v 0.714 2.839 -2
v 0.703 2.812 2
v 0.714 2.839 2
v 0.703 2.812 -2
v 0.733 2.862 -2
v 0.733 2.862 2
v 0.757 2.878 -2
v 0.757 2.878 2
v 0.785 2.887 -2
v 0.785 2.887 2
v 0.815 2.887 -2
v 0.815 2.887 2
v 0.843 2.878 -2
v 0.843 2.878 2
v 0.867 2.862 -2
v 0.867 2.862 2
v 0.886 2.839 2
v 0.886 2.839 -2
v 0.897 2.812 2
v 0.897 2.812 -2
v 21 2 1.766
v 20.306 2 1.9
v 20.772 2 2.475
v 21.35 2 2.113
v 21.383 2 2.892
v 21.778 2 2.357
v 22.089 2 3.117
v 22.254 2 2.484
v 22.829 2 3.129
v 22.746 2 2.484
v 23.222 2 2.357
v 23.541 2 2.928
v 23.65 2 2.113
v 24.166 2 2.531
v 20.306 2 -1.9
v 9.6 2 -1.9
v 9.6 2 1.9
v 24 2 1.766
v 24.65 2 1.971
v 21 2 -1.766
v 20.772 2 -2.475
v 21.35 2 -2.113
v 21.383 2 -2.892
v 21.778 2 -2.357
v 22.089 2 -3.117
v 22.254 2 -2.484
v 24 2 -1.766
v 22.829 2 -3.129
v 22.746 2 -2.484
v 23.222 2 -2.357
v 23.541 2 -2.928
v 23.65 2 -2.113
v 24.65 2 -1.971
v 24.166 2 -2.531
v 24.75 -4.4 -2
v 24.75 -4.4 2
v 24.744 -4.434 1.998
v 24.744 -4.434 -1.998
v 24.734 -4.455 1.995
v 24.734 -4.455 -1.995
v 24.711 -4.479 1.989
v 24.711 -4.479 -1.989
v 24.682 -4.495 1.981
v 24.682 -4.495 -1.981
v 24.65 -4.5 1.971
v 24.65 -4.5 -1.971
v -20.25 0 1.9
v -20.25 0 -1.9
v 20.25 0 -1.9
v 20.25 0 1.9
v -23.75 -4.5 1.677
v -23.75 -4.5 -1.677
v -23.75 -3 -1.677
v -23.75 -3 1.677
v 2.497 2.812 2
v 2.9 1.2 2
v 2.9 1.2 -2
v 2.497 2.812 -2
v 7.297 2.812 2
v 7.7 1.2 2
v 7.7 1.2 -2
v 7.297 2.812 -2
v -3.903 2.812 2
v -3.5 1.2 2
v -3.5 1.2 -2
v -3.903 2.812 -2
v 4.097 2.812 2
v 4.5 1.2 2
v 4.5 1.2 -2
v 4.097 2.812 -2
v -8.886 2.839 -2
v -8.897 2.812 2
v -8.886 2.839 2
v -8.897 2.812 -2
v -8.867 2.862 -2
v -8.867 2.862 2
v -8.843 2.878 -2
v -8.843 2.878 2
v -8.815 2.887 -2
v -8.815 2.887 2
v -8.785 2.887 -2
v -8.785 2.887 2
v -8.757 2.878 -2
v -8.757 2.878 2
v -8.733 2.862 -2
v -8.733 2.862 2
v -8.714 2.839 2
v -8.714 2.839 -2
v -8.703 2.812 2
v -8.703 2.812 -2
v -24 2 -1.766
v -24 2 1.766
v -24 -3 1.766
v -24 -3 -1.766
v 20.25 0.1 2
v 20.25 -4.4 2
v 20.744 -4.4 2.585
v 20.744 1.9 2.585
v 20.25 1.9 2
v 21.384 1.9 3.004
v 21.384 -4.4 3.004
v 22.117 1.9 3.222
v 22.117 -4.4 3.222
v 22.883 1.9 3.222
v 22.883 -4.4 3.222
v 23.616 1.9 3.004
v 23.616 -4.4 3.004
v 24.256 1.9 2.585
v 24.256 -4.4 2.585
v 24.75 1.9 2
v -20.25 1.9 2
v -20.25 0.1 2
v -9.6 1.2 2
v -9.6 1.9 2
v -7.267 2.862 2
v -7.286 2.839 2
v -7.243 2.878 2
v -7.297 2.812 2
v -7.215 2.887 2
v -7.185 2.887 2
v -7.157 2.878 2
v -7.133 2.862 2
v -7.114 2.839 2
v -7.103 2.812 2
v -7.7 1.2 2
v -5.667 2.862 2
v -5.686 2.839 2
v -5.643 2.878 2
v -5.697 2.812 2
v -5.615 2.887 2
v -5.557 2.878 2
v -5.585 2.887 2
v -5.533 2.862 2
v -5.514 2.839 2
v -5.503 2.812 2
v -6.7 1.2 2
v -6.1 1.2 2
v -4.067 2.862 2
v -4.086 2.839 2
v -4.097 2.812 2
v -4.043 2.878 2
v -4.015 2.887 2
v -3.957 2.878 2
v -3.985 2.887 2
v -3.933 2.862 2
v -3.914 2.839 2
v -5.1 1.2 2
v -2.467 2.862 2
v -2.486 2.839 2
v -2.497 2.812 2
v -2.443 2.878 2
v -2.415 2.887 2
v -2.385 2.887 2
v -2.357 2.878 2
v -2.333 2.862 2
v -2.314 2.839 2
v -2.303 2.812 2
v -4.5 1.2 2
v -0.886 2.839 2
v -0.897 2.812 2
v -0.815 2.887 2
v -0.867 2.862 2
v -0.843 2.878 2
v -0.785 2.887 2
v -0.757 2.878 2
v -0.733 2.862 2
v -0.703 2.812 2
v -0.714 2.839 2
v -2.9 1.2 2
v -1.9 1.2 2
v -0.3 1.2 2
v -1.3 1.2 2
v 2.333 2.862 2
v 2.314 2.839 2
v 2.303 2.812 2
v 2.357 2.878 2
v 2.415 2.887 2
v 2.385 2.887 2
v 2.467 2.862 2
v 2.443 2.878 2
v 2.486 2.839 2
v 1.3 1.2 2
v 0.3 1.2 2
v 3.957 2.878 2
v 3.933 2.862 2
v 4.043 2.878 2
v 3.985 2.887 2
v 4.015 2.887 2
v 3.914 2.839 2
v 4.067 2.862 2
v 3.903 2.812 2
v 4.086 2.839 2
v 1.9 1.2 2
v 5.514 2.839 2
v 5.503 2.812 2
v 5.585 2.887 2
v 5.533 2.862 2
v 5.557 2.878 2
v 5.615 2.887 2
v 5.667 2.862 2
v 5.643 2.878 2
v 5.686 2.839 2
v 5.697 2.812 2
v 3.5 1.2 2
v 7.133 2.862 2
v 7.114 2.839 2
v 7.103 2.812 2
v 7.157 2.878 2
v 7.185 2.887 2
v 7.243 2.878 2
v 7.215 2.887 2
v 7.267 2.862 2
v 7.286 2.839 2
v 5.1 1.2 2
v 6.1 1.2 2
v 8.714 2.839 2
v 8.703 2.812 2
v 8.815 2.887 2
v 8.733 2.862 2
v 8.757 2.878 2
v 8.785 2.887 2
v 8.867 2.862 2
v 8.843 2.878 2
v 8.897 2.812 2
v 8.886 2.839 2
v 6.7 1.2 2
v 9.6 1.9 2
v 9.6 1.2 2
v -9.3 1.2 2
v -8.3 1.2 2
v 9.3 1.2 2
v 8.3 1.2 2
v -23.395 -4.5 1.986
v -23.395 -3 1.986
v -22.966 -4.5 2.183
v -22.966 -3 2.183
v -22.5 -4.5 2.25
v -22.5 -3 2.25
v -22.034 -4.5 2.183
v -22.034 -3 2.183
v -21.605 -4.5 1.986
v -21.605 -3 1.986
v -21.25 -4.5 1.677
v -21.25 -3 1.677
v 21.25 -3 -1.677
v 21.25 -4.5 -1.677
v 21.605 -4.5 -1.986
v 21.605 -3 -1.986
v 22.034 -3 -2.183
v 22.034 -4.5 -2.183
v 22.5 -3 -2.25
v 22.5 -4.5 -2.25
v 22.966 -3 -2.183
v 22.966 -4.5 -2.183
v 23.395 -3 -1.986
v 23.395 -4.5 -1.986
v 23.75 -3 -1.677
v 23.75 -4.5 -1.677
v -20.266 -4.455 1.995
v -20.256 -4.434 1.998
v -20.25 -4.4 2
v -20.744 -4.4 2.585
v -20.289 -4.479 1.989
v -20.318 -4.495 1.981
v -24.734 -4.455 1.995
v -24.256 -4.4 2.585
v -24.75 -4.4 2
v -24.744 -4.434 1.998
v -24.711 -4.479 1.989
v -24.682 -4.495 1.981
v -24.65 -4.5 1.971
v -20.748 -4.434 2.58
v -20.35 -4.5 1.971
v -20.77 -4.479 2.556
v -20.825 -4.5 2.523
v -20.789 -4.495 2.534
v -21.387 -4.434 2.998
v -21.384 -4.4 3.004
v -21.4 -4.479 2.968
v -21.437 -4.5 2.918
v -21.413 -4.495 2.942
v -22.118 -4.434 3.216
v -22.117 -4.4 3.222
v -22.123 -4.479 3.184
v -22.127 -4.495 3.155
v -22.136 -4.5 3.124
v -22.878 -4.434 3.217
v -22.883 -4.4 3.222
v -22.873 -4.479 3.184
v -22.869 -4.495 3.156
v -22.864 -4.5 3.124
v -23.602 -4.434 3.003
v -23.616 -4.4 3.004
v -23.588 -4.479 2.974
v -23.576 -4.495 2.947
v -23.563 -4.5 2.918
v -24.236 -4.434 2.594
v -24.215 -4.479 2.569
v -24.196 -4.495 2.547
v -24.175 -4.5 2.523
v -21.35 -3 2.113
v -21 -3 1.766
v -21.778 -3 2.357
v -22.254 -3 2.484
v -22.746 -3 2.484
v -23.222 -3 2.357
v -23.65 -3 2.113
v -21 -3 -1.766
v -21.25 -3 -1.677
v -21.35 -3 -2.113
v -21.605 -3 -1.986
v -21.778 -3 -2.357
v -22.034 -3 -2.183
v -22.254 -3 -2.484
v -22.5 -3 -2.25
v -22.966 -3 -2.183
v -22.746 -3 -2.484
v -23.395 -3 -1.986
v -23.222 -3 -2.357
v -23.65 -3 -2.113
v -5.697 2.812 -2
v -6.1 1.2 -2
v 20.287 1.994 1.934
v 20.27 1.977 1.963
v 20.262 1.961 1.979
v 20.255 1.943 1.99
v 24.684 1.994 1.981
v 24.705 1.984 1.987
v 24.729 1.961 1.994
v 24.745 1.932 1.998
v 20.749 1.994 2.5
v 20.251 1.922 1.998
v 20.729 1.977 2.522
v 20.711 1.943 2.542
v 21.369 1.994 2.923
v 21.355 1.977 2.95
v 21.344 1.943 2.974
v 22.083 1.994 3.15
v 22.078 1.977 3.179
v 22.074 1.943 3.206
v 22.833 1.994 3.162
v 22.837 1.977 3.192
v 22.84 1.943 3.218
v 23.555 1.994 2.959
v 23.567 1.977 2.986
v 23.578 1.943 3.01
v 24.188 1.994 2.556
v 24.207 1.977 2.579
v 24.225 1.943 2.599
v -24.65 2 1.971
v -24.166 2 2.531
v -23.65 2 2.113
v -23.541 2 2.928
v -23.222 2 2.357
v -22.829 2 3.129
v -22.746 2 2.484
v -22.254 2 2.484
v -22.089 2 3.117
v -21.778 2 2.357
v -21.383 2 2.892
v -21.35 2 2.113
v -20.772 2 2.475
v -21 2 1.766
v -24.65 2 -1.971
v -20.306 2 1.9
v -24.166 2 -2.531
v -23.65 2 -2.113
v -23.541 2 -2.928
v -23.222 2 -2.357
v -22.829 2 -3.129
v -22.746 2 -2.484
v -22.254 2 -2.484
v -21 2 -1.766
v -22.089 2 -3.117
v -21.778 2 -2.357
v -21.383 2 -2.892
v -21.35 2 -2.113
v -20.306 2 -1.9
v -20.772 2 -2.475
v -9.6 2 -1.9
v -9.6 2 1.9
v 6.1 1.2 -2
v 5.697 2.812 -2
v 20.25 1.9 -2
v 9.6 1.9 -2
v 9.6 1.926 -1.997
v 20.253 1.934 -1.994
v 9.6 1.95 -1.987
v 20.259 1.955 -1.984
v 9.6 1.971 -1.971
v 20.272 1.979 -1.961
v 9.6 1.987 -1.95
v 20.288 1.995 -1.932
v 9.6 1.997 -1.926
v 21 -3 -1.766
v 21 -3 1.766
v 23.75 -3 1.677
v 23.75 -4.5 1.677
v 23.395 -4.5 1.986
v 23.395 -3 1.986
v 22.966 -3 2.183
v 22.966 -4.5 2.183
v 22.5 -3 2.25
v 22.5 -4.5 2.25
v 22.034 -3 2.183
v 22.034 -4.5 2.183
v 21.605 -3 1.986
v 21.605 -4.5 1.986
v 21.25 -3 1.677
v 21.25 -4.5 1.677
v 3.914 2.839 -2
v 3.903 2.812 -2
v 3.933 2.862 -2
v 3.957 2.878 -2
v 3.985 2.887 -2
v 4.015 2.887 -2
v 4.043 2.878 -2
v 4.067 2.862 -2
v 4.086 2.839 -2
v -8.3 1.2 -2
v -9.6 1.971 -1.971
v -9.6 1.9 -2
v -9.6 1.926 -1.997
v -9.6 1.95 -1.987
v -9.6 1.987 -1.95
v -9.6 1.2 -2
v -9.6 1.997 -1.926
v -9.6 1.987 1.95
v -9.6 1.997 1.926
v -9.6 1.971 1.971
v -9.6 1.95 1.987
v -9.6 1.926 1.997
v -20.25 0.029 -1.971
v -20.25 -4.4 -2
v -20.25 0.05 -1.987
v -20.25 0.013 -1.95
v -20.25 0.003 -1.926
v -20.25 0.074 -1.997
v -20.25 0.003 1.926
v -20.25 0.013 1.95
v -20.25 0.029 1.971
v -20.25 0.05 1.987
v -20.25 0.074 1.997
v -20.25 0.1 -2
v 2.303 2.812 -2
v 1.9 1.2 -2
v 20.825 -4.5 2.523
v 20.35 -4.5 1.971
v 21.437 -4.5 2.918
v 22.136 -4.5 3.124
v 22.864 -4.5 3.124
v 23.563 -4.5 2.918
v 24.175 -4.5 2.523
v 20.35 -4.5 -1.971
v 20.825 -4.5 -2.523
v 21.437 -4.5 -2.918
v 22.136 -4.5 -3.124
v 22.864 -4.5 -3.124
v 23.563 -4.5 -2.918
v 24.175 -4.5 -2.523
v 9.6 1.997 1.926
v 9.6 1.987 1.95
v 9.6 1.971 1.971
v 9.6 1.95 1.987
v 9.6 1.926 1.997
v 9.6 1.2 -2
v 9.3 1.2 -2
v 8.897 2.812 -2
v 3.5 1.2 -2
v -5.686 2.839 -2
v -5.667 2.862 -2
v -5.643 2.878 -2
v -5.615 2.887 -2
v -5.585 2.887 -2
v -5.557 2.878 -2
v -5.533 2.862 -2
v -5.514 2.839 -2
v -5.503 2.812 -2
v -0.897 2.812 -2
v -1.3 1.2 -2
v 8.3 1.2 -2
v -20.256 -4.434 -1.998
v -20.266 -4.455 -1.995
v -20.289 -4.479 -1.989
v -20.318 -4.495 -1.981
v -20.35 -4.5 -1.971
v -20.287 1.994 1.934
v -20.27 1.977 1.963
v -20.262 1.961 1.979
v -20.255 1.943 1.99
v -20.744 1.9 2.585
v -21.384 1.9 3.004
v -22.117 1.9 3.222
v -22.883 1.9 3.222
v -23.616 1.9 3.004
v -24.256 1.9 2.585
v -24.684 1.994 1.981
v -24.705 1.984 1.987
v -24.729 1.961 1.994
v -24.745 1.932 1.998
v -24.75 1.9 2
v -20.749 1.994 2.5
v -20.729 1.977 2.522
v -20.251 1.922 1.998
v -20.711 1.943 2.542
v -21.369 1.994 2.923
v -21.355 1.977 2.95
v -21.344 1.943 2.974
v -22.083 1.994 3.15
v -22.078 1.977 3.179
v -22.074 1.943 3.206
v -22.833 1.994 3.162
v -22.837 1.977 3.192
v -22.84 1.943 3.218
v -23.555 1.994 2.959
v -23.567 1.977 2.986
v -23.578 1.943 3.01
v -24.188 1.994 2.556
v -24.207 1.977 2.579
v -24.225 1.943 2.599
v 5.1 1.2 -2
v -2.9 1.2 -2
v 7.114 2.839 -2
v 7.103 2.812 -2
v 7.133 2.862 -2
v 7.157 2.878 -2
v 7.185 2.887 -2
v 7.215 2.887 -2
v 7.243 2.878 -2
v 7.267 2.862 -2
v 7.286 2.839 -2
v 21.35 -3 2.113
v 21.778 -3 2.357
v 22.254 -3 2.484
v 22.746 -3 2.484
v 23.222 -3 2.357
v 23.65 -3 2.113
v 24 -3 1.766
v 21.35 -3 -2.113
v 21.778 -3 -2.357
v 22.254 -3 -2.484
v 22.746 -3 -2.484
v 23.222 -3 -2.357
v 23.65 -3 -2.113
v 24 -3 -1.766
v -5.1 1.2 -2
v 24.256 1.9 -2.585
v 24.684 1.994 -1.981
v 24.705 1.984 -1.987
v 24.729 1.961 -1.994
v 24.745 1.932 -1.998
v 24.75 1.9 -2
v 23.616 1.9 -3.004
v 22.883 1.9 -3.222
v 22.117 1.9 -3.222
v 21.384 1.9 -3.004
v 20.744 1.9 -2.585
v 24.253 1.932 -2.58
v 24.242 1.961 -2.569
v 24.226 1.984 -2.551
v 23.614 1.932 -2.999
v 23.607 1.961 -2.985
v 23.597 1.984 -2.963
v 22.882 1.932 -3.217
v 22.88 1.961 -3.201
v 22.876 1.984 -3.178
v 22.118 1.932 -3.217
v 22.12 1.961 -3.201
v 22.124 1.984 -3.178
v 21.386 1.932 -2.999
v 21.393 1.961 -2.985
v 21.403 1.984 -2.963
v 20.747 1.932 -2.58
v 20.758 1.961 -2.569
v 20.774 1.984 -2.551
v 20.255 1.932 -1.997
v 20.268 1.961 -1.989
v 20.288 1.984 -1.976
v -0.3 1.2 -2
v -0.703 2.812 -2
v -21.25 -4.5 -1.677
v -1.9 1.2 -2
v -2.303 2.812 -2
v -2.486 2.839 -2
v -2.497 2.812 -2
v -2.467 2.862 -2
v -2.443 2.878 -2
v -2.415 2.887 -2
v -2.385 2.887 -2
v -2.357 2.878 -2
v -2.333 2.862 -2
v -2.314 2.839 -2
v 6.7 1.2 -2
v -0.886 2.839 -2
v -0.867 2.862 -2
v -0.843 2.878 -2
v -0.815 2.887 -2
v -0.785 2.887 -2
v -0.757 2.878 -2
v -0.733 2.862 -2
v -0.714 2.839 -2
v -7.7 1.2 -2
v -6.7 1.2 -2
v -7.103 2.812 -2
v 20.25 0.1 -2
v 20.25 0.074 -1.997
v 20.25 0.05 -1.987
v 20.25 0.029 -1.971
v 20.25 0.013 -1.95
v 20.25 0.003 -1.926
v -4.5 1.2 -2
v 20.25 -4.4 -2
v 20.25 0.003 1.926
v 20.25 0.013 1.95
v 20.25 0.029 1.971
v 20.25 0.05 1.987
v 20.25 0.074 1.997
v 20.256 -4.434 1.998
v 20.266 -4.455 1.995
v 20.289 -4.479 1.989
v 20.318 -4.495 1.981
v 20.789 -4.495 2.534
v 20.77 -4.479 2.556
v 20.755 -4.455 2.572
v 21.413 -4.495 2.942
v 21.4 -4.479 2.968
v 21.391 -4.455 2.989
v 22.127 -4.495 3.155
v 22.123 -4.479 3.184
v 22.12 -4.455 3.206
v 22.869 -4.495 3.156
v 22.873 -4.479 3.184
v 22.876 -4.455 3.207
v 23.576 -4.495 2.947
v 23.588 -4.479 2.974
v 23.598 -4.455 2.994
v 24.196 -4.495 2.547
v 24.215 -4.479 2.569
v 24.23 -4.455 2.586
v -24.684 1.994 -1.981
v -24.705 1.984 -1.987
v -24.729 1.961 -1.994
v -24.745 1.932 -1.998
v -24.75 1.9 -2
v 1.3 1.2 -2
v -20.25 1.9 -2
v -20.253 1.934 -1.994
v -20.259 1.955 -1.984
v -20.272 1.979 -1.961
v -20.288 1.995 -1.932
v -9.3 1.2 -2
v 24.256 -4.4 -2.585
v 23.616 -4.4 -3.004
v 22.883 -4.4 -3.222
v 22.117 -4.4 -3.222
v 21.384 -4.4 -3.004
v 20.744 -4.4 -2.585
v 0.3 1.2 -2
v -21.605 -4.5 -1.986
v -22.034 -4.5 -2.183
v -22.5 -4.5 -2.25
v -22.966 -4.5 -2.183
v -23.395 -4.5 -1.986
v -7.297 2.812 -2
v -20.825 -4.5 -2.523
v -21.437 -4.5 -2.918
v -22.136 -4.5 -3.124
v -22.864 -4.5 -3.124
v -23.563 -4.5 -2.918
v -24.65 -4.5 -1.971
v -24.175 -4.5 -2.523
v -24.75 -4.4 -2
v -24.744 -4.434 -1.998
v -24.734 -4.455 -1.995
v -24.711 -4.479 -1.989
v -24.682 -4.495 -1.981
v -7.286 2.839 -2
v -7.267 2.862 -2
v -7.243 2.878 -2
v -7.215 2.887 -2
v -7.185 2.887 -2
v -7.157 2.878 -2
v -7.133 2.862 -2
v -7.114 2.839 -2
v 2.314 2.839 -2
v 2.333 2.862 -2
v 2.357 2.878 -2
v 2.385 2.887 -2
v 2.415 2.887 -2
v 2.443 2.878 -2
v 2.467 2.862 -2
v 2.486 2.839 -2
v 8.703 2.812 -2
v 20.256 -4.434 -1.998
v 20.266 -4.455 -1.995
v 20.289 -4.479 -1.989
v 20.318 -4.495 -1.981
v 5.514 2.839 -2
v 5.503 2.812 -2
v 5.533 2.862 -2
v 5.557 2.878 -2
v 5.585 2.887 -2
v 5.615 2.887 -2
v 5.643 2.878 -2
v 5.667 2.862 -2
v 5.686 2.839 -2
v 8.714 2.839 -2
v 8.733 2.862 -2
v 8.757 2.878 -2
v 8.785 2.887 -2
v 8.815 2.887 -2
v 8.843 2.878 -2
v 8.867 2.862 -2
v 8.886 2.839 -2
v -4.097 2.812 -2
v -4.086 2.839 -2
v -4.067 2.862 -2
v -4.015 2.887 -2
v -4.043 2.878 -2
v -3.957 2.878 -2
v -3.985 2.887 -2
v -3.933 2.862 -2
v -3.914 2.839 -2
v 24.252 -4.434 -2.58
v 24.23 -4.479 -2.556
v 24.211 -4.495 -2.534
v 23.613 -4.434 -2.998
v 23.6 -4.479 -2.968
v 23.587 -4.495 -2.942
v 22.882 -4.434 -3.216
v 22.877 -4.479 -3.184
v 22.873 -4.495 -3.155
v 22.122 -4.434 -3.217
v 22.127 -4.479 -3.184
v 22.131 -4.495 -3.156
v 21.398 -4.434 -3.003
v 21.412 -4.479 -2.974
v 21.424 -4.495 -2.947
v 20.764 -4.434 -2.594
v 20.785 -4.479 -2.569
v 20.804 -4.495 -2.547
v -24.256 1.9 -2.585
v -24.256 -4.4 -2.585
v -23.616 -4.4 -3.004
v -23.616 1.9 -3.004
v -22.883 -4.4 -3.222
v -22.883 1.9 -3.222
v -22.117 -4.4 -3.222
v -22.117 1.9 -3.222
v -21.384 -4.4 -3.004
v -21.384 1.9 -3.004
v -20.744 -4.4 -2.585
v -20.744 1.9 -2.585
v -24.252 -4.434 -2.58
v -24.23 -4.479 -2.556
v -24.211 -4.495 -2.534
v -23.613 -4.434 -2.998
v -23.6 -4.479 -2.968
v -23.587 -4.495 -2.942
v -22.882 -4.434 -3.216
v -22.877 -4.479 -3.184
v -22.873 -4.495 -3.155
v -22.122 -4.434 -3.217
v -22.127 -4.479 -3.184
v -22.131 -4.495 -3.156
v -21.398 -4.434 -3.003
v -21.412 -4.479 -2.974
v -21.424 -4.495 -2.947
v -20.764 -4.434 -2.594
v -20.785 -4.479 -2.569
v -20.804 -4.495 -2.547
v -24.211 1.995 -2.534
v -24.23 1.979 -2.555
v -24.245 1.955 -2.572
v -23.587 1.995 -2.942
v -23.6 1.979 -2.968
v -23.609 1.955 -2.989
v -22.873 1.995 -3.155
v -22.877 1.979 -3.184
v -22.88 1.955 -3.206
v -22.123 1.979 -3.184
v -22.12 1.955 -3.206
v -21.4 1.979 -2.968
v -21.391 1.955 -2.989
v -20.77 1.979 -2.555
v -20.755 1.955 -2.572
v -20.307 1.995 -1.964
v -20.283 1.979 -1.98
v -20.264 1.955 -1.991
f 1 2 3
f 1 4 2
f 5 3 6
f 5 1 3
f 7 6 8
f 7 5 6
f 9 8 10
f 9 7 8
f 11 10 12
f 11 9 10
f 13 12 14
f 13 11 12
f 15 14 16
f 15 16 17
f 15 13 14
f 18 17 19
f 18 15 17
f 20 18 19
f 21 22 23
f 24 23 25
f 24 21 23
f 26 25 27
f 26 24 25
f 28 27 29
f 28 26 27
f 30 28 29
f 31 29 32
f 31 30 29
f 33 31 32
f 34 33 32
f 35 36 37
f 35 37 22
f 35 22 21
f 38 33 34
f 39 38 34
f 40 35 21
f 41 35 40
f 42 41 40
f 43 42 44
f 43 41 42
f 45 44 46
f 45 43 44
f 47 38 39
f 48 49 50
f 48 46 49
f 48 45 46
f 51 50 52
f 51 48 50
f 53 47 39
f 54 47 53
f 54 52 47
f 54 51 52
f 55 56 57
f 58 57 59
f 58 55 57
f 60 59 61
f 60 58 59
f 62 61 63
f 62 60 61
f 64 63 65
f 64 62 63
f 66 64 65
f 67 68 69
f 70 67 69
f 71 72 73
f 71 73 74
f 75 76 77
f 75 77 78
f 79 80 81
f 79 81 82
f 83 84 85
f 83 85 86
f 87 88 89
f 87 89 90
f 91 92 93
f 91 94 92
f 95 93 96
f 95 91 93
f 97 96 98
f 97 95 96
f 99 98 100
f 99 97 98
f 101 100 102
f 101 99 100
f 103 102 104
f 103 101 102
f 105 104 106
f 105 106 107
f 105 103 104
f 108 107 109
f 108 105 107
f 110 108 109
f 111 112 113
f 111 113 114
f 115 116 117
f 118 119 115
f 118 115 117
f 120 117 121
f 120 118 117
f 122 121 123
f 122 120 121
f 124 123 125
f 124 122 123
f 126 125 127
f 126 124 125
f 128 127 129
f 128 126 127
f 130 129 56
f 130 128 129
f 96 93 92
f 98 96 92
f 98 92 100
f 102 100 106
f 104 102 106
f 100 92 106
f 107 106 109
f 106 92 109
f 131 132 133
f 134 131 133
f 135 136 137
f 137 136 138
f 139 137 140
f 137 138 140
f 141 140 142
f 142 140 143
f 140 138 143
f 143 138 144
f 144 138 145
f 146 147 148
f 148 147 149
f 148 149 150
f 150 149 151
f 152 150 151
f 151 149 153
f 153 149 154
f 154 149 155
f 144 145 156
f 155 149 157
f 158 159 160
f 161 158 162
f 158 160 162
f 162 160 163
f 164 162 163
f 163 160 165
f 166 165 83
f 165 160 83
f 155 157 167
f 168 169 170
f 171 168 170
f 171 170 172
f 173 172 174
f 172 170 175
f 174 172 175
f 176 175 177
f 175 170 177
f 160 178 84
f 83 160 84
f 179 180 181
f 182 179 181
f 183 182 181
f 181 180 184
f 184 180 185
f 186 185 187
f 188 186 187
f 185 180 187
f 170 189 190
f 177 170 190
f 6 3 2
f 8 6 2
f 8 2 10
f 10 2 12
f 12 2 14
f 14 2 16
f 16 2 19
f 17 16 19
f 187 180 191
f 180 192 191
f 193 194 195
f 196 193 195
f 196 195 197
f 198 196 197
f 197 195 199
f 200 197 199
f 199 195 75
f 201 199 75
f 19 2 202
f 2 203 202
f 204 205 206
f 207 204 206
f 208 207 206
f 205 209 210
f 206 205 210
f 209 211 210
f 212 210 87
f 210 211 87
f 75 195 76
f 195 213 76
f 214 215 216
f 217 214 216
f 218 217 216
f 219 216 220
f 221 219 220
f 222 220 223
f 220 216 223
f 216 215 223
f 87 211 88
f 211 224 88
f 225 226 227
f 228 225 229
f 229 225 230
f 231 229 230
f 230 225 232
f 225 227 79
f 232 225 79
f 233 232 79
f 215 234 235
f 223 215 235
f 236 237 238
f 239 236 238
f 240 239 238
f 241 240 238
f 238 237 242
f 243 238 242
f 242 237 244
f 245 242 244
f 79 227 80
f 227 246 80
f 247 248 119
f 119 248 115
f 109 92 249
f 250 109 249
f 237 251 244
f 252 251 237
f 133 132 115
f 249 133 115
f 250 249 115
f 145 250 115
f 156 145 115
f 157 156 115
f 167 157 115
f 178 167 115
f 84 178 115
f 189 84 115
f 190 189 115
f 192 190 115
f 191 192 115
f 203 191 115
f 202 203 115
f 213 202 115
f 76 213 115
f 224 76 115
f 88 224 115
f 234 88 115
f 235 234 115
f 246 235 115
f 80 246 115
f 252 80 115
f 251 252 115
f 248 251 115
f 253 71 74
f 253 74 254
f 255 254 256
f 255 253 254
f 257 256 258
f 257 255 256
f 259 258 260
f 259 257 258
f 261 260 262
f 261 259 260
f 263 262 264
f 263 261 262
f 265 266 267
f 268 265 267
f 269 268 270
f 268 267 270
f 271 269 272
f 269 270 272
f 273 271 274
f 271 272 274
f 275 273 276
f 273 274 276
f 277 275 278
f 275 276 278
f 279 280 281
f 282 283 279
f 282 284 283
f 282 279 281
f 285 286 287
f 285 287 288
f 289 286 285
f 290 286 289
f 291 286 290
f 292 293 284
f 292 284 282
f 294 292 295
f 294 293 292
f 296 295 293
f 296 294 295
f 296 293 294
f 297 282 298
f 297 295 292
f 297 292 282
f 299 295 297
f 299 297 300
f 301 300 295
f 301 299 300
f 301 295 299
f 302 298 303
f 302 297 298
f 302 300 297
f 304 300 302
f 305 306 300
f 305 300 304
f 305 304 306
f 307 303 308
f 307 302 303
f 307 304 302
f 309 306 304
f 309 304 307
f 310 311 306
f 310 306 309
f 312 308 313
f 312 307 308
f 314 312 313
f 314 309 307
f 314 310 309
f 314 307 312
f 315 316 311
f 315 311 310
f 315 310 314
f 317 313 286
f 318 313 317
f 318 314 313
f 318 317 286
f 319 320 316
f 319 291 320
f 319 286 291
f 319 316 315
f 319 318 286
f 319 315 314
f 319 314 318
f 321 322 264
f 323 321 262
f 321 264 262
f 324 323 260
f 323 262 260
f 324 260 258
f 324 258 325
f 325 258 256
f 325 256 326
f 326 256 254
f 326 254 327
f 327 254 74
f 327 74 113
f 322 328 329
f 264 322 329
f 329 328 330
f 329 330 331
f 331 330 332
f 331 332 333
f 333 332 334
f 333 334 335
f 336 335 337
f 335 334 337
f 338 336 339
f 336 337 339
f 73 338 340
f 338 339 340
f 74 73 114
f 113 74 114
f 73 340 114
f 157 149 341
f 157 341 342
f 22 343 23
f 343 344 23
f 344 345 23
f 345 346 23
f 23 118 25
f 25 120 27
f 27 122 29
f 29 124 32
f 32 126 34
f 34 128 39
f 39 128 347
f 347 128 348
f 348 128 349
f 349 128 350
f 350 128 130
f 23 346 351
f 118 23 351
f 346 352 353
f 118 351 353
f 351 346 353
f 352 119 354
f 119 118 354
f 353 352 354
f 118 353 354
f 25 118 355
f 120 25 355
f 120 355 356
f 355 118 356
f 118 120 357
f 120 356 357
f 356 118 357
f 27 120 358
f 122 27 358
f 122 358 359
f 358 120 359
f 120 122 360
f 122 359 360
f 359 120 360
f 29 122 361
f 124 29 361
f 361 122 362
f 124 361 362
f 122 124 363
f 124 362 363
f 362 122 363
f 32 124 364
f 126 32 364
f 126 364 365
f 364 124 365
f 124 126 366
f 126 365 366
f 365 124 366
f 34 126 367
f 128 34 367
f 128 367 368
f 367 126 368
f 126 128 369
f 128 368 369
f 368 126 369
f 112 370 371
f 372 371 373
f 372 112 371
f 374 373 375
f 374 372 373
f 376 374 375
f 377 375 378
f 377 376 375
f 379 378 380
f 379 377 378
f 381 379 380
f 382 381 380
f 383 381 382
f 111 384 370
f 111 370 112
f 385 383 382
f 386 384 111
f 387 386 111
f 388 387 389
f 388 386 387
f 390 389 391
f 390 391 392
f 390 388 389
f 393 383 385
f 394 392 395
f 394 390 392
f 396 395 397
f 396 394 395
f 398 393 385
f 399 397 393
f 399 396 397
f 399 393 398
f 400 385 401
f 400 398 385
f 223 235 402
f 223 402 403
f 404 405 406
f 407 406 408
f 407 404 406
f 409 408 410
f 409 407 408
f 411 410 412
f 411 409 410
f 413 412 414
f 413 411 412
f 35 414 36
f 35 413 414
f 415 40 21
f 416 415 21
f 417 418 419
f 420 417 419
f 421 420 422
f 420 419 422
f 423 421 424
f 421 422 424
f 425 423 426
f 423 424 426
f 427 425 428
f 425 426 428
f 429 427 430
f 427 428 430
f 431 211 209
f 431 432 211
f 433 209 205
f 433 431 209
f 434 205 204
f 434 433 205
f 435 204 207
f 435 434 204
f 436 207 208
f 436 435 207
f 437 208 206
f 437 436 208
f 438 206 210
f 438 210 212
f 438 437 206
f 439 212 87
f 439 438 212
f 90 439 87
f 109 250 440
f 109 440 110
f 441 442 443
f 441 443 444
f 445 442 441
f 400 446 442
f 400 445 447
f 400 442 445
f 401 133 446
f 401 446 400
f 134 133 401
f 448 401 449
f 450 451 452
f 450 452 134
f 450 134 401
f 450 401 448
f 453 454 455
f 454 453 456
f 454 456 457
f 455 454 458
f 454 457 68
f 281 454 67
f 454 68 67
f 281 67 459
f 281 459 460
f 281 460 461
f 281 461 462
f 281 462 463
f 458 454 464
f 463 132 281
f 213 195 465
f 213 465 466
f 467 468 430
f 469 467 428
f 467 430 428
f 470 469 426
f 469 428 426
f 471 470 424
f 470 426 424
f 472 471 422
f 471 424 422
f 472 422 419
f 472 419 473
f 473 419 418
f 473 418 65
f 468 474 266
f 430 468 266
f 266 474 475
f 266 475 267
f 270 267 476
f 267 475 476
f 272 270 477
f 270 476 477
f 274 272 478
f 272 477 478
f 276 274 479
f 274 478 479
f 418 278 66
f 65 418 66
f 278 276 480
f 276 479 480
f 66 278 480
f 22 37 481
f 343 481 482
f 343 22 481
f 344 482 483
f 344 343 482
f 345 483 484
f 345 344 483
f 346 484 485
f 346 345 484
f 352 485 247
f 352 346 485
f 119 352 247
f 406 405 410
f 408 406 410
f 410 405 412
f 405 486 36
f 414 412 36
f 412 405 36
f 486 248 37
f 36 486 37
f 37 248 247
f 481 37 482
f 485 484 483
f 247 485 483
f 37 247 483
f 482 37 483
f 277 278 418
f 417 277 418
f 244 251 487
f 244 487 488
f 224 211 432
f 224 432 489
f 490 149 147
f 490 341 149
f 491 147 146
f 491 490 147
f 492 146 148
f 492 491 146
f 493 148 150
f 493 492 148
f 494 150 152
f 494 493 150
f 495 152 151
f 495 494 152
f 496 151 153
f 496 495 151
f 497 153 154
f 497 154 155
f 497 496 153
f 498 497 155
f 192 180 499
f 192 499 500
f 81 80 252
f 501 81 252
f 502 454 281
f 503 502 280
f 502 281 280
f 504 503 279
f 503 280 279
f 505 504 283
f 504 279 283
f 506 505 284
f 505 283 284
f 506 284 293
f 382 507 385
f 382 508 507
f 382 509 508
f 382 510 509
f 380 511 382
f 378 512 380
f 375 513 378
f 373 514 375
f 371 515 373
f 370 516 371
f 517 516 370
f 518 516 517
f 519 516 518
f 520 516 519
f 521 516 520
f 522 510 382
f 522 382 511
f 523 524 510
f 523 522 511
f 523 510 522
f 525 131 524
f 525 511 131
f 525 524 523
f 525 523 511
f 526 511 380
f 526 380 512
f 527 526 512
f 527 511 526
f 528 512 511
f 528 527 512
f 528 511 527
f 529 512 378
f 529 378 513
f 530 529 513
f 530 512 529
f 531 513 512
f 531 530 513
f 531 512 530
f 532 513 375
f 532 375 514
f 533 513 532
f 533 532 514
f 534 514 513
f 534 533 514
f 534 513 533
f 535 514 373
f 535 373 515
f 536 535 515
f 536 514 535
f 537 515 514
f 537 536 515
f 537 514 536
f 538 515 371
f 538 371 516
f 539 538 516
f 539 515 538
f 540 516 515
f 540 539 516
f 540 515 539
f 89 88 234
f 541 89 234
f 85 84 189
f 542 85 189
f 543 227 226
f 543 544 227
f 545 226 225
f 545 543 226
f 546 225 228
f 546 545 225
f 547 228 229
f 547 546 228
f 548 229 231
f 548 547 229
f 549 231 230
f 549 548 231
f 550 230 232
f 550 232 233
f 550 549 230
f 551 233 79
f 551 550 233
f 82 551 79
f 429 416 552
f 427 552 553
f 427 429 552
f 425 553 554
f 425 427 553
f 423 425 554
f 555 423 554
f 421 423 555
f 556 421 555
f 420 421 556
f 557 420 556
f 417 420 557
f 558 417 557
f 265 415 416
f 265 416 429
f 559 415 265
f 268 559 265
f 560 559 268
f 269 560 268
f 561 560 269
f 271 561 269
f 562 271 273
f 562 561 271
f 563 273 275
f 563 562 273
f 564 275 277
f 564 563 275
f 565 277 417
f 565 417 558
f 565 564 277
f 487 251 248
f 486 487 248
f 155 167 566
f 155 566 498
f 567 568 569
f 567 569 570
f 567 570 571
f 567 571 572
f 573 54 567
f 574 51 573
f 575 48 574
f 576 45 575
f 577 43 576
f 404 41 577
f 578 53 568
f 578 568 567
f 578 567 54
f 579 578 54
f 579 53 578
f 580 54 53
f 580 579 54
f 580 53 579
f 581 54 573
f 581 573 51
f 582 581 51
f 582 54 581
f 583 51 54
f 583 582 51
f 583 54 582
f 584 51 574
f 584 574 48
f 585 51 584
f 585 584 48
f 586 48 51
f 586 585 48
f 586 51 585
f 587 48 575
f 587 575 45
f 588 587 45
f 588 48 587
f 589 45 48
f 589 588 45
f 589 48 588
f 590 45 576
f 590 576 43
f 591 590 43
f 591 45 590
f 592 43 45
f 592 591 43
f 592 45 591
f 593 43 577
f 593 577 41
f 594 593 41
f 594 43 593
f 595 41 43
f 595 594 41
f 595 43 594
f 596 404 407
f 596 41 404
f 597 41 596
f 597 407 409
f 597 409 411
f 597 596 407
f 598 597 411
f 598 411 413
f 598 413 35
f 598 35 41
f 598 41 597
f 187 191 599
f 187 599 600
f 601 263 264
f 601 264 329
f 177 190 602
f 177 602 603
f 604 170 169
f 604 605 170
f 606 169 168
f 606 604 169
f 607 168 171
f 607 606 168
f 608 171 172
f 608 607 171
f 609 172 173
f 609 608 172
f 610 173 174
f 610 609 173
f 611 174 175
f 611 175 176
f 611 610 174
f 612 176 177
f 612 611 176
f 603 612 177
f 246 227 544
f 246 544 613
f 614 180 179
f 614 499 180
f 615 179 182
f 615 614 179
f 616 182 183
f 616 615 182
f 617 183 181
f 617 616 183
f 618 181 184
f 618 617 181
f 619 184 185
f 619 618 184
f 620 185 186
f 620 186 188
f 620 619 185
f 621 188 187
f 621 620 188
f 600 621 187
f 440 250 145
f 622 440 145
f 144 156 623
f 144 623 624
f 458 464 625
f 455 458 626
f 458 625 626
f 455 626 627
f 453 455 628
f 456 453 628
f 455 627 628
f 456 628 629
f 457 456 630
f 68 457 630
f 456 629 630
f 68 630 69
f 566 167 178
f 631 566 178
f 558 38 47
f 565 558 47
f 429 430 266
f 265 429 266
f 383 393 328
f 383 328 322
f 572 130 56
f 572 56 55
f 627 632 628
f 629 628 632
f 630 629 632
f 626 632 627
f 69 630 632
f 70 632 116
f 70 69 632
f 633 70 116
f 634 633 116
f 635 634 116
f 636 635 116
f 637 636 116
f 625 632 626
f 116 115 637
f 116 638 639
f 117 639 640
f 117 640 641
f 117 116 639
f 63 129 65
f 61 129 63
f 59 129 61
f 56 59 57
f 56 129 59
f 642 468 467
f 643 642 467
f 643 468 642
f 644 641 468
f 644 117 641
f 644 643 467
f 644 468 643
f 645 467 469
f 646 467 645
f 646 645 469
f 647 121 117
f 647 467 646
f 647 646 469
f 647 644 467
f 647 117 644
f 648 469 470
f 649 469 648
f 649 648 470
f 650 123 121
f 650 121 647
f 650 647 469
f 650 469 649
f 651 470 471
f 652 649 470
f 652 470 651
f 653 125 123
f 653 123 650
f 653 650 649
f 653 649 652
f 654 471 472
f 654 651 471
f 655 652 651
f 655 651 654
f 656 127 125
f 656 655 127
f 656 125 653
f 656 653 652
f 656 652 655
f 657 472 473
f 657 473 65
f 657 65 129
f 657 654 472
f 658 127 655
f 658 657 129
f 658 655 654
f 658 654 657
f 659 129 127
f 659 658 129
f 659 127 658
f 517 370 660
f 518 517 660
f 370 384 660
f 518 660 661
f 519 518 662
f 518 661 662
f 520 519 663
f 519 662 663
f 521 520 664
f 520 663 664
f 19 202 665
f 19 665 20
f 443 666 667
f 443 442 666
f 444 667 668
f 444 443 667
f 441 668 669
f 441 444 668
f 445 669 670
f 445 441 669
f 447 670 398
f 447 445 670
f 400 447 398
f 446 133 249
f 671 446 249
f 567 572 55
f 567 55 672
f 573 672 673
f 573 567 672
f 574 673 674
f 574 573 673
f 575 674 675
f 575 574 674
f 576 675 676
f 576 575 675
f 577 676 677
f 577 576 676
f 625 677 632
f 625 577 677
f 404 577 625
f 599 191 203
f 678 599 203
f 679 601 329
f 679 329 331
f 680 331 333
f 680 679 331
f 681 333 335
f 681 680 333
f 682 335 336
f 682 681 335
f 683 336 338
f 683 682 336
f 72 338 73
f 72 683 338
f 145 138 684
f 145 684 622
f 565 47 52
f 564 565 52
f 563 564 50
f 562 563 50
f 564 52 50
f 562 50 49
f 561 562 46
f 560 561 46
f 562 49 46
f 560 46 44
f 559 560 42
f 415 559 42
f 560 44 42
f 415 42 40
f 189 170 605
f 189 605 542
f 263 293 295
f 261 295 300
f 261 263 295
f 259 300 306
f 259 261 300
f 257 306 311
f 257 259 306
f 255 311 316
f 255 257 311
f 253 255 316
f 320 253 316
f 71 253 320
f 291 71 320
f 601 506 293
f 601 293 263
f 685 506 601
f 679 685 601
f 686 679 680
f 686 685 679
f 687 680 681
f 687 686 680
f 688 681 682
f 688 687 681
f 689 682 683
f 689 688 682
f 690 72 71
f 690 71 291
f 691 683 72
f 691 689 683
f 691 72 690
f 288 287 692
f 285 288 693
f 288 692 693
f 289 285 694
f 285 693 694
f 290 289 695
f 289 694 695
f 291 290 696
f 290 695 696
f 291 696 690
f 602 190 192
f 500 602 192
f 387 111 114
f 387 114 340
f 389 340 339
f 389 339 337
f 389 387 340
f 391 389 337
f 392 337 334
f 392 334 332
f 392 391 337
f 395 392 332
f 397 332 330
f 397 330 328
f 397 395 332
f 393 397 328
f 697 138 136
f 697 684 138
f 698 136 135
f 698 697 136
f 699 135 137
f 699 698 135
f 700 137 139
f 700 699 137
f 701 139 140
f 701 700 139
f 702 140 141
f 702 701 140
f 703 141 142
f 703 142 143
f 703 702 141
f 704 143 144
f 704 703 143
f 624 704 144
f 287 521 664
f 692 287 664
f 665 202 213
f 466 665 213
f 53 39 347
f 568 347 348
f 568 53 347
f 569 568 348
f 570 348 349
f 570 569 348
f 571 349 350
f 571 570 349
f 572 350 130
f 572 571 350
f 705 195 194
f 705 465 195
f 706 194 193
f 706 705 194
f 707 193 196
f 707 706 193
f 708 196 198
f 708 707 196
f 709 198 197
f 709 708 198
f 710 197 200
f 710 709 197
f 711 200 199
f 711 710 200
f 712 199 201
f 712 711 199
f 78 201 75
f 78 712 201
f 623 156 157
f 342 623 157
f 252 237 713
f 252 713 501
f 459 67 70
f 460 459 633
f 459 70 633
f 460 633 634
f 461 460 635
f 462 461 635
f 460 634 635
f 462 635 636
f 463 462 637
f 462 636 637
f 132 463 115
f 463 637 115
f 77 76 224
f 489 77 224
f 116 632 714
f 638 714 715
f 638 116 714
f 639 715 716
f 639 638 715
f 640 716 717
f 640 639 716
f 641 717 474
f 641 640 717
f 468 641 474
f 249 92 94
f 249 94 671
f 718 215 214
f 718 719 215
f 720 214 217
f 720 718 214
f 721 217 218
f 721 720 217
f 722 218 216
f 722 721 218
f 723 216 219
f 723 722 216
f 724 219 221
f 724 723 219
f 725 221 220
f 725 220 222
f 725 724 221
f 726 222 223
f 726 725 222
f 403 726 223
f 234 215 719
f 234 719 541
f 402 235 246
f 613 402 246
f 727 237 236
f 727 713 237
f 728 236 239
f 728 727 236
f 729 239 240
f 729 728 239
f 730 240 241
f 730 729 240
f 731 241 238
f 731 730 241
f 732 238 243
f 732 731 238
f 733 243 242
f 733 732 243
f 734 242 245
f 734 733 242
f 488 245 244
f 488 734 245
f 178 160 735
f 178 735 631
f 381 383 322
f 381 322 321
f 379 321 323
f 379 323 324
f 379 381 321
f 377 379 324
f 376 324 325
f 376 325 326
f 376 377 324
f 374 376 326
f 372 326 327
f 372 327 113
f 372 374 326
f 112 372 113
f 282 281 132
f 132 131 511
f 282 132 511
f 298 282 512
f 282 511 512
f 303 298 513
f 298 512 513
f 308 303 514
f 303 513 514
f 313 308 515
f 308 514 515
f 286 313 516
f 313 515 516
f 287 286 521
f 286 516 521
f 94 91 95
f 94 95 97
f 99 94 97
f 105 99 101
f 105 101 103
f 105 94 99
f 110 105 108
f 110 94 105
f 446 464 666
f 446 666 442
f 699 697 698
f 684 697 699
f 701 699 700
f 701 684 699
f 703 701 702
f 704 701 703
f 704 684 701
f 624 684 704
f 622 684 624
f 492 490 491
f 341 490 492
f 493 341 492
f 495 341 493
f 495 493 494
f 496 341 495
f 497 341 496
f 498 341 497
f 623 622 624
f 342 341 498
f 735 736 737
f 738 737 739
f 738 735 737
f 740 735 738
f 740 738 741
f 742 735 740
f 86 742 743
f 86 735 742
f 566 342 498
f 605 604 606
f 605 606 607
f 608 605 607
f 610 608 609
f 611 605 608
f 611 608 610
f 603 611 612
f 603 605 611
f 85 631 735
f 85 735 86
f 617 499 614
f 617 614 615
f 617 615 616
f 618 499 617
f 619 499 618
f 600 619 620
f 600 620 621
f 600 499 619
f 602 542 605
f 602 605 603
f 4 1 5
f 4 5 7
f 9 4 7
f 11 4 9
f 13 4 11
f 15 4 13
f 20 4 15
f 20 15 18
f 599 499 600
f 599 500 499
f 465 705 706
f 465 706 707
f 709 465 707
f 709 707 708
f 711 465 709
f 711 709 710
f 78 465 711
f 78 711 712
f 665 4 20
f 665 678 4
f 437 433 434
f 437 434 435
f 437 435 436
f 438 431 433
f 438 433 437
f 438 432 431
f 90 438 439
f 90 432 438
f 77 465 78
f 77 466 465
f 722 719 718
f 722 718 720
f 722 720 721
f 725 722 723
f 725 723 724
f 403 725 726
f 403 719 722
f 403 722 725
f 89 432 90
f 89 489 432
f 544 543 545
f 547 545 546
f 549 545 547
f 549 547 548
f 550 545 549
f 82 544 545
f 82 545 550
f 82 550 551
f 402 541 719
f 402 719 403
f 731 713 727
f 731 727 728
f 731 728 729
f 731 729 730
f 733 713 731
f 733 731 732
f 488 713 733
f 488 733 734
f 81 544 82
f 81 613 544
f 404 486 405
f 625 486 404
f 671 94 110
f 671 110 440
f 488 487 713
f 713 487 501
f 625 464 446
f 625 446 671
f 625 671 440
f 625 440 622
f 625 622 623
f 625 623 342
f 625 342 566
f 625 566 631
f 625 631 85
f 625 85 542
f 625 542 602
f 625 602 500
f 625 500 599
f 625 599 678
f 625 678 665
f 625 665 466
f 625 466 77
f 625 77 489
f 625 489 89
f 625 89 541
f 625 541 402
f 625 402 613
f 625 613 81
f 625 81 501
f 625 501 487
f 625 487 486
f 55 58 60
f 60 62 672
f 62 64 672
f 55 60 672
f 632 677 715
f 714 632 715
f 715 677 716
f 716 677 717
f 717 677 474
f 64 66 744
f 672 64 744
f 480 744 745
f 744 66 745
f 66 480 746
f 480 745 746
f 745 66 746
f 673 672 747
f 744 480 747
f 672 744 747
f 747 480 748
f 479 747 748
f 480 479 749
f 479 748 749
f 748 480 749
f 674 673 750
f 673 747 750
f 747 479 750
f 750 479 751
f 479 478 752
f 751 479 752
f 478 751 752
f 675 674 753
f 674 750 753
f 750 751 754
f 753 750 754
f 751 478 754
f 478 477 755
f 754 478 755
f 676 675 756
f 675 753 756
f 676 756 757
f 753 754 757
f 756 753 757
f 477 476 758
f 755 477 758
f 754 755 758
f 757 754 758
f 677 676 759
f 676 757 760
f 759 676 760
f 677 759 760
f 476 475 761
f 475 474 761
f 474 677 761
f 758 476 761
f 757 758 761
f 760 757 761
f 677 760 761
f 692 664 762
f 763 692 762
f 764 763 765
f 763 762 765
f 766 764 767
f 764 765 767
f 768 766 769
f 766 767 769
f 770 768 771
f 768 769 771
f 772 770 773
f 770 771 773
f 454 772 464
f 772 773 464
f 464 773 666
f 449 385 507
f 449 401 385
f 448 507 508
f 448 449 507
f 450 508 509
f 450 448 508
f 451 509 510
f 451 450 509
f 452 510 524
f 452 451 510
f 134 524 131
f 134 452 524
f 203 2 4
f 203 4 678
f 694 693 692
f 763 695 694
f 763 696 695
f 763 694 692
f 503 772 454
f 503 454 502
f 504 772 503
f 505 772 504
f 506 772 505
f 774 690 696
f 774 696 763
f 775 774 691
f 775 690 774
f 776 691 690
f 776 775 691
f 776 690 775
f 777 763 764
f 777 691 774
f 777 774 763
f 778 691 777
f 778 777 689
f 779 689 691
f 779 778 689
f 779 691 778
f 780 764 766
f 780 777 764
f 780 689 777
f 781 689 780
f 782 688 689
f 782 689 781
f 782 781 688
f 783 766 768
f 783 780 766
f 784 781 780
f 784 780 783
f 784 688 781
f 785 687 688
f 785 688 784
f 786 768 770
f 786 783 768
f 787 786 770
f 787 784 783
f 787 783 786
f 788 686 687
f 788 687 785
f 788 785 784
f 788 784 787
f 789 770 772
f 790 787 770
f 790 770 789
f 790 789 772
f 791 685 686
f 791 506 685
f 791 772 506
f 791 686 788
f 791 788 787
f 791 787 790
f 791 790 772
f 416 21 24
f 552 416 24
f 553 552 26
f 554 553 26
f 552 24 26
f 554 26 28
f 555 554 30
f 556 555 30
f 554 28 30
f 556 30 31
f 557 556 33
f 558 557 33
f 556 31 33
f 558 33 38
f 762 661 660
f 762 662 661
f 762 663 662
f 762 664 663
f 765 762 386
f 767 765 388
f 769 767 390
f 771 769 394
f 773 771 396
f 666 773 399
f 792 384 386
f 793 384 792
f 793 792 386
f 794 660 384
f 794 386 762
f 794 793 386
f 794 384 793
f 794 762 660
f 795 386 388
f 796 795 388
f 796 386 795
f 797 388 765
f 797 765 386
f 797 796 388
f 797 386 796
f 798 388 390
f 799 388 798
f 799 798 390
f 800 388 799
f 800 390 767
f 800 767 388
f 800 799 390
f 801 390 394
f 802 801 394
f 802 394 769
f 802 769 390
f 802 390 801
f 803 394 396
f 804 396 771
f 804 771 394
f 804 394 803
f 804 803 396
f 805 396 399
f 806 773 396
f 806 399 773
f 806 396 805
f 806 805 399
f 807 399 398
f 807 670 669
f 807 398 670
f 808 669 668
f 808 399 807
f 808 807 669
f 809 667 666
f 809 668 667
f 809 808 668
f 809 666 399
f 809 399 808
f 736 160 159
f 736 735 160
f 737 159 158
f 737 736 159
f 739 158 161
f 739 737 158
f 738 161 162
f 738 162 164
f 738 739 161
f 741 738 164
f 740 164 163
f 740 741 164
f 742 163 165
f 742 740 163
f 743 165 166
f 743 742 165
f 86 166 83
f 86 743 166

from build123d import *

# Parameters (mm, degrees)
SKETCH_1_W                     = 42
SKETCH_1_H                     = 4
EXTRUDE_1_DEPTH                = 2
EXTRUDE_2_DEPTH                = 6.5
CUT_EXTRUDE_1_DEPTH            = 5
CUT_EXTRUDE_2_DEPTH            = 1.5
CUT_EXTRUDE_3_REACH            = 27.698
SKETCH_5_W                     = 19.2
SKETCH_5_H                     = 0.8
EXTRUDE_3_DEPTH                = 4
FILLET_1_R                     = 0.1
PATTERN_LINEAR_1_COUNT         = 12
PATTERN_LINEAR_1_PITCH         = 1.6
FILLET_1_OF_PATTERN_LINEAR_1_R = 0.1
FILLET_2_R                     = 0.1


with BuildPart() as part:
    # 草图1 → 凸台-拉伸1 (new body)
    with BuildSketch(Plane(origin=(0, 0, 0), x_dir=(1, 0, 0), z_dir=(0, 1, 0))):
        Rectangle(SKETCH_1_W, SKETCH_1_H)
    extrude(amount=EXTRUDE_1_DEPTH)

    # 草图2 → 凸台-拉伸2 (add)
    with BuildSketch(Plane(origin=(0, 2, 0), x_dir=(1, 0, 0), z_dir=(0, 1, 0))):
        with BuildLine():
            Line((20.25, 2), (20.25, -2))
            ThreePointArc((20.25, -2), (22.5, -3.25), (24.75, -2))
            Line((24.75, -2), (24.75, 2))
            ThreePointArc((24.75, 2), (22.5, 3.25), (20.25, 2))
        make_face()
    extrude_2 = extrude(amount=-EXTRUDE_2_DEPTH)

    # 草图3 → 切除-拉伸1 (cut)
    with BuildSketch(Plane(origin=(0, 2, 0), x_dir=(1, 0, 0), z_dir=(0, 1, 0))):
        with BuildLine():
            Line((21, 1.766190379), (21, -1.766190379))
            ThreePointArc((21, -1.766190379), (22.5, -2.5), (24, -1.766190379))
            Line((24, -1.766190379), (24, 1.766190379))
            ThreePointArc((24, 1.766190379), (22.5, 2.5), (21, 1.766190379))
        make_face()
    cut_extrude_1 = extrude(amount=-CUT_EXTRUDE_1_DEPTH, mode=Mode.SUBTRACT)

    # 草图4 → 切除-拉伸2 (cut)
    with BuildSketch(Plane.XZ.offset(4.5)):
        with BuildLine():
            Line((23.75, -1.677032961), (23.75, 1.677032961))
            ThreePointArc((23.75, 1.677032961), (22.5, 2.25), (21.25, 1.677032961))
            Line((21.25, 1.677032961), (21.25, -1.677032961))
            ThreePointArc((21.25, -1.677032961), (22.5, -2.25), (23.75, -1.677032961))
        make_face()
    cut_extrude_2 = extrude(amount=-CUT_EXTRUDE_2_DEPTH, mode=Mode.SUBTRACT)

    # 镜向1: 凸台-拉伸2, 切除-拉伸1, 切除-拉伸2 across plane
    add(extrude_2.mirror(Plane(origin=(0, 0, 0), x_dir=(0, 0, 1), z_dir=(1, 0, 0))))
    add(cut_extrude_1.mirror(Plane(origin=(0, 0, 0), x_dir=(0, 0, 1), z_dir=(1, 0, 0))), mode=Mode.SUBTRACT)
    add(cut_extrude_2.mirror(Plane(origin=(0, 0, 0), x_dir=(0, 0, 1), z_dir=(1, 0, 0))), mode=Mode.SUBTRACT)

    # 草图5 → 切除-拉伸3 (cut, up to next)
    with BuildSketch(Plane.XY.offset(2), mode=Mode.PRIVATE) as cut_extrude_3_sk1:
        with Locations((0, 1.6)):
            Rectangle(SKETCH_5_W, SKETCH_5_H)
    cut_extrude_3_tool1 = extrude(cut_extrude_3_sk1.sketch, amount=-CUT_EXTRUDE_3_REACH, mode=Mode.PRIVATE) & part.part
    add(cut_extrude_3_tool1.solids().sort_by_distance((0, 1.6, 2))[0], mode=Mode.SUBTRACT)

    # 草图6 → 凸台-拉伸3 (add)
    with BuildSketch(Plane.XY.offset(2)):
        Polygon((-9.3, 1.2), (-8.3, 1.2), (-8.8, 3.2), align=None)
    extrude_3 = extrude(amount=-EXTRUDE_3_DEPTH)

    # 圆角1
    fillet_1_edges = [part.edges().sort_by_distance(p)[0] for p in [
        (-8.8, 3.2, 0),
    ]]
    fillet(fillet_1_edges, radius=FILLET_1_R)

    # 阵列(线性)1: 凸台-拉伸3 ×12
    with Locations(*[(i * PATTERN_LINEAR_1_PITCH, 0, 0) for i in range(1, PATTERN_LINEAR_1_COUNT)]):
        add(extrude_3)

    # 圆角1 of 阵列(线性)1
    fillet_1_of_pattern_linear_1_edges = [part.edges().sort_by_distance(p)[0] for p in [
        (-7.2, 3.2, 0),
        (-5.6, 3.2, 0),
        (-4, 3.2, 0),
        (-2.4, 3.2, 0),
        (-0.8, 3.2, 0),
        (0.8, 3.2, 0),
        (2.4, 3.2, 0),
        (4, 3.2, 0),
        (5.6, 3.2, 0),
        (7.2, 3.2, 0),
        (8.8, 3.2, 0),
    ]]
    fillet(fillet_1_of_pattern_linear_1_edges, radius=FILLET_1_OF_PATTERN_LINEAR_1_R)

    # 圆角2
    fillet_2_edges = [part.edges().sort_by_distance(p)[0] for p in [
        (14.925, 2, 2),
        (-14.925, 2, -2),
        (0, 0, -2),
        (14.925, 2, -2),
        (22.5, 2, 3.25),
        (24.75, 2, 0),
        (22.5, 2, -3.25),
        (20.25, -4.5, 0),
        (22.5, -4.5, -3.25),
        (24.75, -4.5, 0),
        (22.5, -4.5, 3.25),
        (0, 0, 2),
        (-14.925, 2, 2),
        (-22.5, 2, -3.25),
        (-22.5, 2, 3.25),
        (-24.75, 2, 0),
        (-22.5, -4.5, -3.25),
        (-20.25, -4.5, 0),
        (-22.5, -4.5, 3.25),
        (-24.75, -4.5, 0),
    ]]
    fillet(fillet_2_edges, radius=FILLET_2_R)


solid = part.part
